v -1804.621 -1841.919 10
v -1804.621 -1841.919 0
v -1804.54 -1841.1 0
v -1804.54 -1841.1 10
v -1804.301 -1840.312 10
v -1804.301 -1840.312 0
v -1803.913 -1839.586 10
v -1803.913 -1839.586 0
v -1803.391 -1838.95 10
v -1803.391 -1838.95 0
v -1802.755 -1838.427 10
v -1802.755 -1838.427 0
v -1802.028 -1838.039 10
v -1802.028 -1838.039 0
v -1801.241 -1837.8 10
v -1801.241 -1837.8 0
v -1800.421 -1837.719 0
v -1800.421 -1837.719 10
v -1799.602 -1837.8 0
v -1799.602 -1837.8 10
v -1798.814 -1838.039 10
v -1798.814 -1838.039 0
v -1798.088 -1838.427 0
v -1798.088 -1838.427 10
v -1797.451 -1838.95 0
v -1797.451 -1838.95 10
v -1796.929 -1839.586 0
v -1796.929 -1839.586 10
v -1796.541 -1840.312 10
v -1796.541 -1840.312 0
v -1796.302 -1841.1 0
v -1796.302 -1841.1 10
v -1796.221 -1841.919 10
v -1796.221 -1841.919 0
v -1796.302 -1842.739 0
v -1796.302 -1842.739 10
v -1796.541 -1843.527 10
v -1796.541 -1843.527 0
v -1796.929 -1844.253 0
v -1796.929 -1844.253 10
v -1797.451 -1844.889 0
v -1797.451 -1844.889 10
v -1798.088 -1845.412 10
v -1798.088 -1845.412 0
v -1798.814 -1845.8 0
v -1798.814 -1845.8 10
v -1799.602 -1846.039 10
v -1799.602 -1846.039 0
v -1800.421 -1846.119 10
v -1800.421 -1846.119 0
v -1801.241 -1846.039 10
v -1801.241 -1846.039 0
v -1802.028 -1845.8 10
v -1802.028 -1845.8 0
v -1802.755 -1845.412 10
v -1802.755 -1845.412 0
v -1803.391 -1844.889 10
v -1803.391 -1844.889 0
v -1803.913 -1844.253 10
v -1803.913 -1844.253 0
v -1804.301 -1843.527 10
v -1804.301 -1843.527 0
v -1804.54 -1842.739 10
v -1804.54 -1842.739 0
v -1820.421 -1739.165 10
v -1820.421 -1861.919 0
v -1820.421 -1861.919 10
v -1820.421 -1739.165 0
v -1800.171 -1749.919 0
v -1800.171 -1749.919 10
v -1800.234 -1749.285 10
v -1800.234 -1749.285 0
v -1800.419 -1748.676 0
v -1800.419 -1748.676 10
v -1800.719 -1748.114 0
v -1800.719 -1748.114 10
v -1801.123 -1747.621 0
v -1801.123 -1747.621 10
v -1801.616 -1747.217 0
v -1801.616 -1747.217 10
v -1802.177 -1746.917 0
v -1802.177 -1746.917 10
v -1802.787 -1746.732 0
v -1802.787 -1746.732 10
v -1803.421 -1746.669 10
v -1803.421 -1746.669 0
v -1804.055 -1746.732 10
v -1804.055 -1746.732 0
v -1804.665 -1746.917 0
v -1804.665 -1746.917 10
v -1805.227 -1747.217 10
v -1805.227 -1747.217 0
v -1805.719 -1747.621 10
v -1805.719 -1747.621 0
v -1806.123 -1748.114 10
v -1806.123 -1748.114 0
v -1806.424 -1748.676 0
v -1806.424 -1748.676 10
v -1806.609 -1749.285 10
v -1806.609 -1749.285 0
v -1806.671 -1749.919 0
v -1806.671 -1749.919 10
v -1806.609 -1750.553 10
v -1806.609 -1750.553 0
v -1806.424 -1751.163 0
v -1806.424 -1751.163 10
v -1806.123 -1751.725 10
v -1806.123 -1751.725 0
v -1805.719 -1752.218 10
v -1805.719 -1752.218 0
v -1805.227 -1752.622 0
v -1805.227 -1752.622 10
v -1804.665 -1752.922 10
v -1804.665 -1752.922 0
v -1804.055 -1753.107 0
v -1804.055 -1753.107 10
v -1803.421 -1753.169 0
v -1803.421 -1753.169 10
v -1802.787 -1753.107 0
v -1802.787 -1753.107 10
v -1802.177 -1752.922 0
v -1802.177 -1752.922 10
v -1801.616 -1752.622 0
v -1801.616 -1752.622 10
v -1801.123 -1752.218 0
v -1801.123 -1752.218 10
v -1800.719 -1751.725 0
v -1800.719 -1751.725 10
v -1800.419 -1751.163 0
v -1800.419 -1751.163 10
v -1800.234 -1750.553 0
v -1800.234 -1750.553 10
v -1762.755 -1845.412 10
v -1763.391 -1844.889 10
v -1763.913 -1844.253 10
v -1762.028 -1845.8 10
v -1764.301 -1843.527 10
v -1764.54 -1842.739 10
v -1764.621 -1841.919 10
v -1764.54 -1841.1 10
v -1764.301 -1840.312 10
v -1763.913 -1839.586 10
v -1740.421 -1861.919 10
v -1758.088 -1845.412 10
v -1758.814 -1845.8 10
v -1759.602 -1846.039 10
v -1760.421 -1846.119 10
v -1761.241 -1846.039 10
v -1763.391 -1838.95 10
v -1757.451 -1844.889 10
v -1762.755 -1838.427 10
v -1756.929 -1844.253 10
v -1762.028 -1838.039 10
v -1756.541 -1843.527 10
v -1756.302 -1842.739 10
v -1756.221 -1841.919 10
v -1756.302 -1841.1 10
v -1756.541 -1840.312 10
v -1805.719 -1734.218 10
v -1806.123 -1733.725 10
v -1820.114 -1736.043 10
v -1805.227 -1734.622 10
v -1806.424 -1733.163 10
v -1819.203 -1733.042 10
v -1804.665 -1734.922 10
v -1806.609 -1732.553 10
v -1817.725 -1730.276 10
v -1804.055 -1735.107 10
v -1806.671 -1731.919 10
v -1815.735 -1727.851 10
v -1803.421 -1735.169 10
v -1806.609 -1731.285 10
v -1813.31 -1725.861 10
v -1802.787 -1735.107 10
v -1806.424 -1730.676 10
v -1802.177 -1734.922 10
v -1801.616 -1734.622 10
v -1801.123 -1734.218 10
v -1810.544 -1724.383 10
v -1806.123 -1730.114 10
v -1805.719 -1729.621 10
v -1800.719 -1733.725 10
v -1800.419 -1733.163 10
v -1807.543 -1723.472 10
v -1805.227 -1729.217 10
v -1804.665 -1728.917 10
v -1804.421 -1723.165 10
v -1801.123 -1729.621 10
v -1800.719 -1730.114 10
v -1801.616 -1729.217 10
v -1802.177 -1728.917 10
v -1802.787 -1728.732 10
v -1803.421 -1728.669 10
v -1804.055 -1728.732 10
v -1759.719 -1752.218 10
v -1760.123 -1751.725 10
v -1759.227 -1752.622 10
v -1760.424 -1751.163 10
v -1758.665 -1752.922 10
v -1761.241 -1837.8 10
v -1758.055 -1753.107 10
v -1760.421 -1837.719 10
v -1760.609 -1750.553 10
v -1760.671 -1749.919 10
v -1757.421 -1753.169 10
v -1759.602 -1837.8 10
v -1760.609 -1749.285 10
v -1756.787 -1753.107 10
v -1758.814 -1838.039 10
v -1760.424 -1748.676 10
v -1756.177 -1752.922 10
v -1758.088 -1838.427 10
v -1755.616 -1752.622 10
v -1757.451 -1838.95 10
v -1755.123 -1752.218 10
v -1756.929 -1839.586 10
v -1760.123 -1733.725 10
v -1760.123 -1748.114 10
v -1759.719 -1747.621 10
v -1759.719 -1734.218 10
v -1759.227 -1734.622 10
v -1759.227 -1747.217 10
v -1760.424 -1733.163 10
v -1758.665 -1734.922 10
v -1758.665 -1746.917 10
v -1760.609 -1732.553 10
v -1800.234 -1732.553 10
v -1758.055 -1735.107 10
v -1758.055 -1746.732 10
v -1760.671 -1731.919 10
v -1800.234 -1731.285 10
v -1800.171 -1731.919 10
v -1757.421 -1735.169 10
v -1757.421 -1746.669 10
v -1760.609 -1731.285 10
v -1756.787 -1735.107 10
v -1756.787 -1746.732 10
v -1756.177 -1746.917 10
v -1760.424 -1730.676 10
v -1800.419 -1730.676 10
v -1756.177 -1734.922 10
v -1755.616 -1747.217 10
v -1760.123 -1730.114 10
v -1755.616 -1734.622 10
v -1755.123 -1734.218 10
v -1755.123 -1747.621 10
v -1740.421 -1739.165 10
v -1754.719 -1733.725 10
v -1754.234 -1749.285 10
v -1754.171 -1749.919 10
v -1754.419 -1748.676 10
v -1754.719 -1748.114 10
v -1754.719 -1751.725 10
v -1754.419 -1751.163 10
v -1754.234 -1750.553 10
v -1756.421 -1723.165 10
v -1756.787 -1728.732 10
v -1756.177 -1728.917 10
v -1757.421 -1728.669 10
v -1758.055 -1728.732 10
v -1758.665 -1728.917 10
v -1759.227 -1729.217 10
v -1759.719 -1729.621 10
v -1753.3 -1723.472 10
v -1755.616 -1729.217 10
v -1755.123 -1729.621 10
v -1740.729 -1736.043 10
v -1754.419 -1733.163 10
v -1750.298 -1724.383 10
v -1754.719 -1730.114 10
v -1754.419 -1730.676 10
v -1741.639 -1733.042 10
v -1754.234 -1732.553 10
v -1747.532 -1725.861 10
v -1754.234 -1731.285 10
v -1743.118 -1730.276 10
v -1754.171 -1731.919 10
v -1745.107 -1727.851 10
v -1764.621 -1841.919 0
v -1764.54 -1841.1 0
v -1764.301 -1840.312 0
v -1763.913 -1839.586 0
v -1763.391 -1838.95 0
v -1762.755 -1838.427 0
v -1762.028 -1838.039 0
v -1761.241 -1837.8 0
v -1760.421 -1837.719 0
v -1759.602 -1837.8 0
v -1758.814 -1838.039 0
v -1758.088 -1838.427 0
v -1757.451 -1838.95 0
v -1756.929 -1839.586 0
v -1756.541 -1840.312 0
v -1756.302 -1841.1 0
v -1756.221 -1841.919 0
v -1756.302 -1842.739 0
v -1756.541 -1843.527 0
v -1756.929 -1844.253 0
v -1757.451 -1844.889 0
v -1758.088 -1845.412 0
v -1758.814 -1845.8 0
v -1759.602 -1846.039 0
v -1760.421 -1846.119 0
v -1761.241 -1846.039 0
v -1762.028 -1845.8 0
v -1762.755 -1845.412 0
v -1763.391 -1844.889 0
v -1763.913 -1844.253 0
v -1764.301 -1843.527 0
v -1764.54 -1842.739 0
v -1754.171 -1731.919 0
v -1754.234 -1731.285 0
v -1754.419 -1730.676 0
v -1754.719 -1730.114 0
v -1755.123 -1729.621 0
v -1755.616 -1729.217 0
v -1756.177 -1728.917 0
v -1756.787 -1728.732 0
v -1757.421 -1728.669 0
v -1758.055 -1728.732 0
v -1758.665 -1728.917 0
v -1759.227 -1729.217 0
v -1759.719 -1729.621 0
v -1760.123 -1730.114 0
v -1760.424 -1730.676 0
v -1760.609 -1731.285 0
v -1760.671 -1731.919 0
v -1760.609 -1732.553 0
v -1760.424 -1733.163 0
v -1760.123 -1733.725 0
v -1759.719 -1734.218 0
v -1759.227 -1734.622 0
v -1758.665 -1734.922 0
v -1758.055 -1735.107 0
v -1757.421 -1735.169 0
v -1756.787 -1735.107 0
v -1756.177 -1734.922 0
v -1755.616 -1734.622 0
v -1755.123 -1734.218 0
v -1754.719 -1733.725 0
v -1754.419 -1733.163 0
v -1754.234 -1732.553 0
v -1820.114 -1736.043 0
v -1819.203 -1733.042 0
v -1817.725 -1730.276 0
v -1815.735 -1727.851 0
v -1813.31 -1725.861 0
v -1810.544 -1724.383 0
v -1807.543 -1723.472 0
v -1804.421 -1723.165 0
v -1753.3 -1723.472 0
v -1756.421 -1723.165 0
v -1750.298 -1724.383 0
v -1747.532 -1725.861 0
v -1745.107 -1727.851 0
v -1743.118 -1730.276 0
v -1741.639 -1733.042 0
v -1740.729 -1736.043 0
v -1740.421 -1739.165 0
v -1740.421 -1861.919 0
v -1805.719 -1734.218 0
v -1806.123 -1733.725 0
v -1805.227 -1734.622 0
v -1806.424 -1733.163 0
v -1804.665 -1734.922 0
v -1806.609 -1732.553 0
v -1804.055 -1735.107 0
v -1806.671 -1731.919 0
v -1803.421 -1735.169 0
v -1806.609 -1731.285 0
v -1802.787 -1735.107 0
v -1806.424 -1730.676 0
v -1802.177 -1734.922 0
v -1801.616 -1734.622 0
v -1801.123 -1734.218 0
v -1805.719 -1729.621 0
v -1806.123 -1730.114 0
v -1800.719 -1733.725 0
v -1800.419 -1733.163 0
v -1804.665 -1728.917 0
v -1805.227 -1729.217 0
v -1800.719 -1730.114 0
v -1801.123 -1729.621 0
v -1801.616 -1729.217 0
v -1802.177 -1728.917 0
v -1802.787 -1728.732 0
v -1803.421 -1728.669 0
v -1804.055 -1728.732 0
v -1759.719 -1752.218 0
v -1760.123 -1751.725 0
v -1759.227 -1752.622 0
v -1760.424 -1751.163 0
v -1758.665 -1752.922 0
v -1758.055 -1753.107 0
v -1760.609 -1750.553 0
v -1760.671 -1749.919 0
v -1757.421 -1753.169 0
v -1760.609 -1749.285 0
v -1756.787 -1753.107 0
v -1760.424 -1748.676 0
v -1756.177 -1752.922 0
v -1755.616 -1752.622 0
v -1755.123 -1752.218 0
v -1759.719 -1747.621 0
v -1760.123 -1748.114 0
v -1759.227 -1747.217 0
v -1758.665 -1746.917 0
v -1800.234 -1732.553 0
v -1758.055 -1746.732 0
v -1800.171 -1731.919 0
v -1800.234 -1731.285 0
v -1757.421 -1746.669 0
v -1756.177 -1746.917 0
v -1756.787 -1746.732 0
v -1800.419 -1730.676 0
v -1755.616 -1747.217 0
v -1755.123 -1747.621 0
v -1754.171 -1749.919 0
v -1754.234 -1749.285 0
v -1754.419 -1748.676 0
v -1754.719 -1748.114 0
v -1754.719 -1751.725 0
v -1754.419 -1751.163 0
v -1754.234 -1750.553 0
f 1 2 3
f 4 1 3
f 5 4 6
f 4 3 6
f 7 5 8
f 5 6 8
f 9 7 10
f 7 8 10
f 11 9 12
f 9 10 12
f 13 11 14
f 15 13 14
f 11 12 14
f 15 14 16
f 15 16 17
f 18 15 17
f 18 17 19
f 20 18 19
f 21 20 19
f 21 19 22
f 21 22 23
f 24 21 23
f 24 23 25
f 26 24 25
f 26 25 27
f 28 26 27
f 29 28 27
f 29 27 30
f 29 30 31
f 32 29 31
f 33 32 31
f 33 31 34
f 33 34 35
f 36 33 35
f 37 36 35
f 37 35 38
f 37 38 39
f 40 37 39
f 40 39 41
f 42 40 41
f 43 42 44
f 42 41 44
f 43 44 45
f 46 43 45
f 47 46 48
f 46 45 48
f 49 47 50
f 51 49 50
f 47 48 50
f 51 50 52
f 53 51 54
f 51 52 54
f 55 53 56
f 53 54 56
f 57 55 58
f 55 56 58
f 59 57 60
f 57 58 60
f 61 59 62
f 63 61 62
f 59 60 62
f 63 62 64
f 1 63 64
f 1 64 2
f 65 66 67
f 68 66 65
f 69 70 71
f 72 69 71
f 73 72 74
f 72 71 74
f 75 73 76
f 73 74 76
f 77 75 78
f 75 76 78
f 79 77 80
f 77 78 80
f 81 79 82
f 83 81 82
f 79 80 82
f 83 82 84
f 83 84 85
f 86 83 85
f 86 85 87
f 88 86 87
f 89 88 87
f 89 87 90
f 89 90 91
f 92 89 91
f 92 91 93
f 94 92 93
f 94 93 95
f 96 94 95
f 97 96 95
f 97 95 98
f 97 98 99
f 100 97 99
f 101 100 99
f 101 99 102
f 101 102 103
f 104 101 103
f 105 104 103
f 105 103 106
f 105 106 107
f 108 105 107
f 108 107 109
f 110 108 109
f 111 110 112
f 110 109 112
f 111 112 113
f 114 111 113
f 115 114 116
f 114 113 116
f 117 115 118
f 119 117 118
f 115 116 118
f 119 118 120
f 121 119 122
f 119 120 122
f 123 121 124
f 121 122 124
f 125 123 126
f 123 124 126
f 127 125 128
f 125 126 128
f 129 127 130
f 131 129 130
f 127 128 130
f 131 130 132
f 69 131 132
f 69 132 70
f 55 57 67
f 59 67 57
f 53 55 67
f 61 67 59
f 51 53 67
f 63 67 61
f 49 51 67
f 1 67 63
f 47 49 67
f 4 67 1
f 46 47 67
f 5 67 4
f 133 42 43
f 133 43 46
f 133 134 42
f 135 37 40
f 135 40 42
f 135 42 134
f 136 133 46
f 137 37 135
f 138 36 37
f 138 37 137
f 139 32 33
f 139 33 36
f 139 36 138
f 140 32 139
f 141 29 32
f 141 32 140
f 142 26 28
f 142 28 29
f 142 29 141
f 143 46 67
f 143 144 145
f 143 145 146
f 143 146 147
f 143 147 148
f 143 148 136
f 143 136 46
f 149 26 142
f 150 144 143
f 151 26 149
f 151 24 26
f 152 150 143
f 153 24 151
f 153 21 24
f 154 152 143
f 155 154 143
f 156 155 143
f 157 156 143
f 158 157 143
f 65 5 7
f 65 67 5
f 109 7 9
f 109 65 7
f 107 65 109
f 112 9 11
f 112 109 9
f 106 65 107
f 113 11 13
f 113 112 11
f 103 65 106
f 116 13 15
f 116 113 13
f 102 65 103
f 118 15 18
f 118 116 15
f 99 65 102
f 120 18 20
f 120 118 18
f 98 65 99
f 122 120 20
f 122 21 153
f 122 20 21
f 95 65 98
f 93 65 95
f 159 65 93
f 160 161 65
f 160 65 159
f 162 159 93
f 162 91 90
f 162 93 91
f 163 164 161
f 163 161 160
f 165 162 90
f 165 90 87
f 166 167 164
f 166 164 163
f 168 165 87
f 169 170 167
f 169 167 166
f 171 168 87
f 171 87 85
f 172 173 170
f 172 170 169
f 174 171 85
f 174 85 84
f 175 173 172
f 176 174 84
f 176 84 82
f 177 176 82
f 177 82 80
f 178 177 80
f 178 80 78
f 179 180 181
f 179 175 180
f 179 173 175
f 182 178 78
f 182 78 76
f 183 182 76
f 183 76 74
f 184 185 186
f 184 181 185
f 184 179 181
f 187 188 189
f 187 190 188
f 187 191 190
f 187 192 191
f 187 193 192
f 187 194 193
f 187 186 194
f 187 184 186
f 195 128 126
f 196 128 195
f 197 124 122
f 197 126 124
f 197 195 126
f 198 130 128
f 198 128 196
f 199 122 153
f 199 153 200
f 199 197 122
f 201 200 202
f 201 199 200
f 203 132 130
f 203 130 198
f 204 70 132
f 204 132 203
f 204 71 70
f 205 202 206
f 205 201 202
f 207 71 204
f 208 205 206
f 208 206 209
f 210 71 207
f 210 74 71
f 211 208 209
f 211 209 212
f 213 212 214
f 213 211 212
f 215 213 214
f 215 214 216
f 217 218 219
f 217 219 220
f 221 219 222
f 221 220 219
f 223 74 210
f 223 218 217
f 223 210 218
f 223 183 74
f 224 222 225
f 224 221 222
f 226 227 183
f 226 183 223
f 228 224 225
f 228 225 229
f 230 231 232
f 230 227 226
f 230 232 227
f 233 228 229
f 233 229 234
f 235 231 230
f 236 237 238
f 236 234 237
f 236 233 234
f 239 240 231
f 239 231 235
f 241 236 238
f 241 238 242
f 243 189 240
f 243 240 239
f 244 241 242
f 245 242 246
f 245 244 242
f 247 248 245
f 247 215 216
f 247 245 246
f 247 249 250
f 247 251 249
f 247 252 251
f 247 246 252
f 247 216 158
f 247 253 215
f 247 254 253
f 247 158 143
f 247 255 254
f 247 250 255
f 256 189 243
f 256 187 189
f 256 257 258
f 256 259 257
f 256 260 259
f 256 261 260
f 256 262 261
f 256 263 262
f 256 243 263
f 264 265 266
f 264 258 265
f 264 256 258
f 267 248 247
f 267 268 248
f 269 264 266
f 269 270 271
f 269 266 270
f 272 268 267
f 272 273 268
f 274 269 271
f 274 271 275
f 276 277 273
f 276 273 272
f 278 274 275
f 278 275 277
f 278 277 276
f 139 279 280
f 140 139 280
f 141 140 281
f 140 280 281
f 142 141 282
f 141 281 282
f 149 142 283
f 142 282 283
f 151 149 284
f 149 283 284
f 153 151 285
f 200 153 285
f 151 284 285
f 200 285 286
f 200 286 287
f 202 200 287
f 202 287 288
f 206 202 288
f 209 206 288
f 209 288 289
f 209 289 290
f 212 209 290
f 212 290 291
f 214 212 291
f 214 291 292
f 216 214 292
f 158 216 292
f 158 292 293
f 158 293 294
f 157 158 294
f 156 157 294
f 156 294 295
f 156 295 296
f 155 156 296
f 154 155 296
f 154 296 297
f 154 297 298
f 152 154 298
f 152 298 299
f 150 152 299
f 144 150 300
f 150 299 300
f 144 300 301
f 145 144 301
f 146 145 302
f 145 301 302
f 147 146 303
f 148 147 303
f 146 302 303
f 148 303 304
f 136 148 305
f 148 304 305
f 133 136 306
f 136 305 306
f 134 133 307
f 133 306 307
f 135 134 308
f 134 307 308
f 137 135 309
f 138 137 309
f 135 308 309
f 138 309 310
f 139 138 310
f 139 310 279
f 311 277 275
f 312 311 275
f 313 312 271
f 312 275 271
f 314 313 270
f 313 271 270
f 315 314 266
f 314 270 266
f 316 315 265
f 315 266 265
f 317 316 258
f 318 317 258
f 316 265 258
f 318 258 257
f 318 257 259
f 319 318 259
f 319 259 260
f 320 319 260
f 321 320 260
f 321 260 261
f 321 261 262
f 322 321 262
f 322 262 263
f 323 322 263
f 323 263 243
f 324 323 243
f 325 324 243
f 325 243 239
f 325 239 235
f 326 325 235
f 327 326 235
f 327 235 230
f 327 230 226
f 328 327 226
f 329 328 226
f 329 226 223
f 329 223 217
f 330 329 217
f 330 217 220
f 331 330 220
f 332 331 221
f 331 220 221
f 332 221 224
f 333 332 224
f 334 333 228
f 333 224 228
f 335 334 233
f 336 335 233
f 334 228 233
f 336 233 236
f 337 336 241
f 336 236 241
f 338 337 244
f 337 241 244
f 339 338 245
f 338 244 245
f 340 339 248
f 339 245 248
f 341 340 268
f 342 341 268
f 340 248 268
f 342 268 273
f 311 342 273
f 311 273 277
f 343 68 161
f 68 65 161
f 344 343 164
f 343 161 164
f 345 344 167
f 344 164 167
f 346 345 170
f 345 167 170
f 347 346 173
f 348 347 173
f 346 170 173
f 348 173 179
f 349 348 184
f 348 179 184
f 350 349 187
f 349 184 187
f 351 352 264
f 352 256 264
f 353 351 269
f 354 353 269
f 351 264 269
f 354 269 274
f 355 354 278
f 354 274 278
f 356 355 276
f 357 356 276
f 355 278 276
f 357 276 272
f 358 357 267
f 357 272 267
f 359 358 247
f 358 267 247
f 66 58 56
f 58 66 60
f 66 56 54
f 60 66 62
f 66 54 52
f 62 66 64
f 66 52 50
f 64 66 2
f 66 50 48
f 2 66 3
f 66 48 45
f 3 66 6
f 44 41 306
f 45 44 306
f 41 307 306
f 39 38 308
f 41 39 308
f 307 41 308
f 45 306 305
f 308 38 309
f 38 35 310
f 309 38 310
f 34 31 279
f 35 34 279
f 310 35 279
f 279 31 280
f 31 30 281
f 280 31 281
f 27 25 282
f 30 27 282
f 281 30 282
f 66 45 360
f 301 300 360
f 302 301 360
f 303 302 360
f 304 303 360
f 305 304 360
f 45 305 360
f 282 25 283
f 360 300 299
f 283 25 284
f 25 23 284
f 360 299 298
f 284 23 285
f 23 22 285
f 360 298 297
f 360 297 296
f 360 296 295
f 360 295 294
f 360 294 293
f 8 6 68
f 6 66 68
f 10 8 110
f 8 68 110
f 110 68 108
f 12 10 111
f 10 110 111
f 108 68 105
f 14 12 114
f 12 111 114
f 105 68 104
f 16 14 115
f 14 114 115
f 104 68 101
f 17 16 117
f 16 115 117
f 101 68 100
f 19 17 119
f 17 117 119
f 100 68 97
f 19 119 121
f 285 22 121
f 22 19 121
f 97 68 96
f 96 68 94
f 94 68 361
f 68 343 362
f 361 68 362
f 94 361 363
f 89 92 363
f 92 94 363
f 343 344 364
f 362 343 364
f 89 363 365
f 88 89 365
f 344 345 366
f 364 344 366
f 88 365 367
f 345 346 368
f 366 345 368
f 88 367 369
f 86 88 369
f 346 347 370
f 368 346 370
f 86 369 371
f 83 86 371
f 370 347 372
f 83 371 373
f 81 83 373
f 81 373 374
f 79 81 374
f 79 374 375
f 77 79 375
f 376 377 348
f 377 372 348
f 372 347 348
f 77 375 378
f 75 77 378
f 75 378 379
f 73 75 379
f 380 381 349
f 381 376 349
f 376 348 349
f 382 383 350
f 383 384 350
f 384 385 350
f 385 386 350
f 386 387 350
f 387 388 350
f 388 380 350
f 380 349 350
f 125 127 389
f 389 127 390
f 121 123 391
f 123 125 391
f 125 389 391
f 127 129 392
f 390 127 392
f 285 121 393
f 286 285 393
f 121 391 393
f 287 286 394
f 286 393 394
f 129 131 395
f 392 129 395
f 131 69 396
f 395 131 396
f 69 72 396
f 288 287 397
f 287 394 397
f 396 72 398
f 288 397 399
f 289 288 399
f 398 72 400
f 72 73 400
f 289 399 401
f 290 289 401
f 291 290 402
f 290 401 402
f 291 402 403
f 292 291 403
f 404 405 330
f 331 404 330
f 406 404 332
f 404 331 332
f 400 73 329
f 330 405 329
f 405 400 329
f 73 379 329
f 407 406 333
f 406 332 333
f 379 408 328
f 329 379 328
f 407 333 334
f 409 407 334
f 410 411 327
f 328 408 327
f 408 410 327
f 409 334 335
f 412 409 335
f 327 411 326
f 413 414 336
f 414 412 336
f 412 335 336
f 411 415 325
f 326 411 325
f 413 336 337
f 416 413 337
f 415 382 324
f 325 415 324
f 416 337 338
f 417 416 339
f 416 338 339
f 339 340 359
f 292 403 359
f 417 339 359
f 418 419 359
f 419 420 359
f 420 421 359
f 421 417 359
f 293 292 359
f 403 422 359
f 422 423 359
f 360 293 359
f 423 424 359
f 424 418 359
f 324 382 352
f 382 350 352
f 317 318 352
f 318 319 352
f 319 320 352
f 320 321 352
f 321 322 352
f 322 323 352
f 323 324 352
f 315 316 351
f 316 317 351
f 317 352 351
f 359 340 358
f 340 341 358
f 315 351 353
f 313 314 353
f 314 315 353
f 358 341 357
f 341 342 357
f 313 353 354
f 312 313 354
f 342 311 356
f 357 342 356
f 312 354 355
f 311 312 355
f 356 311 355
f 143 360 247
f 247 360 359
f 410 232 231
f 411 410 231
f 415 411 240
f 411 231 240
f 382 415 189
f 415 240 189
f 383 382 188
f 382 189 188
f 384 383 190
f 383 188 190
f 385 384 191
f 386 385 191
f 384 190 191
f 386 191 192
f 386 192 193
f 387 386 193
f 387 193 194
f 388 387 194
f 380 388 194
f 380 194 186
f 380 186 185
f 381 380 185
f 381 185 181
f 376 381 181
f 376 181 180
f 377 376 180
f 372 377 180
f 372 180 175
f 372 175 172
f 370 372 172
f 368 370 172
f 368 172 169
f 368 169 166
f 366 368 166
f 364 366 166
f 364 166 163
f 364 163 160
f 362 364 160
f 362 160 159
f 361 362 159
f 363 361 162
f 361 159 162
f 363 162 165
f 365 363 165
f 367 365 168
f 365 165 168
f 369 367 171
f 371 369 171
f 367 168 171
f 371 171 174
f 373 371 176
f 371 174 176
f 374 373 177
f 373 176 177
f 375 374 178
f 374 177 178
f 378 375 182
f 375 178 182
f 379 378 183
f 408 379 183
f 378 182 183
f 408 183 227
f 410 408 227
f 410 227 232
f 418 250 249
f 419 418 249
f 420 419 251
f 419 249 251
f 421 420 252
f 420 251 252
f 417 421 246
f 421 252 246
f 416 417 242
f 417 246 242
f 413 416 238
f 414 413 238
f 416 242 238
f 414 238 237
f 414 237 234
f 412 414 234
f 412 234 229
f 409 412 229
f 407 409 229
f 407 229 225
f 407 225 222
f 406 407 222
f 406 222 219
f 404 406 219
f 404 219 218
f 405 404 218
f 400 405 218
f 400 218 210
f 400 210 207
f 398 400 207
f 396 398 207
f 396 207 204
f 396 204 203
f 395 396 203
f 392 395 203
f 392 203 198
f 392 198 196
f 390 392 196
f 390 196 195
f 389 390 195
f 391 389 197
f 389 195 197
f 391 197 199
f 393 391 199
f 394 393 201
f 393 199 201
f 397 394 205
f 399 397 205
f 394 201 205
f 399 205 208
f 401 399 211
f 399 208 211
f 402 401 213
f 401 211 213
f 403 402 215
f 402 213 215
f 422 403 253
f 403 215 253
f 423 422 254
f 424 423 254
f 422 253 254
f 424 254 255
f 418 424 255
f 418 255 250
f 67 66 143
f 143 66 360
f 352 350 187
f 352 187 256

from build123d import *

# Parameters (mm, degrees)
SKETCH1_W                = 80
SKETCH1_H                = 138.754765379
BOSS_EXTRUDE1_DEPTH      = 10
FORO_PER_VITE_M8_1_D     = 8.4
SCHIZZO1_R               = 3.25
TAGLIO_ESTRUSIONE1_DEPTH = 2604.992537461
RACCORDO1_R              = 16


with BuildPart() as part:
    # Sketch1 → Boss-Extrude1 (new body)
    with BuildSketch(Plane.XY):
        with Locations((-1780.42117355, -1792.542026427)):
            Rectangle(SKETCH1_W, SKETCH1_H)
    extrude(amount=BOSS_EXTRUDE1_DEPTH)

    # Foro per Vite M8-1 (through all)
    with Locations(Plane.XY.offset(10)):
        with Locations((-1760.42117355, -1841.919409116), (-1800.42117355, -1841.919409116)):
            Hole(FORO_PER_VITE_M8_1_D / 2)

    # Schizzo1 → Taglio-Estrusione1 (cut, through all)
    with BuildSketch(Plane.XY.offset(10)):
        with Locations((-1803.421173548, -1731.919409116)):
            Circle(SCHIZZO1_R)
        with Locations((-1803.421173548, -1749.919409116)):
            Circle(SCHIZZO1_R)
        with Locations((-1757.421173548, -1731.919409116)):
            Circle(SCHIZZO1_R)
        with Locations((-1757.421173548, -1749.919409116)):
            Circle(SCHIZZO1_R)
    extrude(amount=-TAGLIO_ESTRUSIONE1_DEPTH, mode=Mode.SUBTRACT)

    # Raccordo1
    raccordo1_edges = [part.edges().sort_by_distance(p)[0] for p in [
        (-1820.42117355, -1723.164643737, 5),
        (-1740.42117355, -1723.164643737, 5),
    ]]
    fillet(raccordo1_edges, radius=RACCORDO1_R)


solid = part.part
